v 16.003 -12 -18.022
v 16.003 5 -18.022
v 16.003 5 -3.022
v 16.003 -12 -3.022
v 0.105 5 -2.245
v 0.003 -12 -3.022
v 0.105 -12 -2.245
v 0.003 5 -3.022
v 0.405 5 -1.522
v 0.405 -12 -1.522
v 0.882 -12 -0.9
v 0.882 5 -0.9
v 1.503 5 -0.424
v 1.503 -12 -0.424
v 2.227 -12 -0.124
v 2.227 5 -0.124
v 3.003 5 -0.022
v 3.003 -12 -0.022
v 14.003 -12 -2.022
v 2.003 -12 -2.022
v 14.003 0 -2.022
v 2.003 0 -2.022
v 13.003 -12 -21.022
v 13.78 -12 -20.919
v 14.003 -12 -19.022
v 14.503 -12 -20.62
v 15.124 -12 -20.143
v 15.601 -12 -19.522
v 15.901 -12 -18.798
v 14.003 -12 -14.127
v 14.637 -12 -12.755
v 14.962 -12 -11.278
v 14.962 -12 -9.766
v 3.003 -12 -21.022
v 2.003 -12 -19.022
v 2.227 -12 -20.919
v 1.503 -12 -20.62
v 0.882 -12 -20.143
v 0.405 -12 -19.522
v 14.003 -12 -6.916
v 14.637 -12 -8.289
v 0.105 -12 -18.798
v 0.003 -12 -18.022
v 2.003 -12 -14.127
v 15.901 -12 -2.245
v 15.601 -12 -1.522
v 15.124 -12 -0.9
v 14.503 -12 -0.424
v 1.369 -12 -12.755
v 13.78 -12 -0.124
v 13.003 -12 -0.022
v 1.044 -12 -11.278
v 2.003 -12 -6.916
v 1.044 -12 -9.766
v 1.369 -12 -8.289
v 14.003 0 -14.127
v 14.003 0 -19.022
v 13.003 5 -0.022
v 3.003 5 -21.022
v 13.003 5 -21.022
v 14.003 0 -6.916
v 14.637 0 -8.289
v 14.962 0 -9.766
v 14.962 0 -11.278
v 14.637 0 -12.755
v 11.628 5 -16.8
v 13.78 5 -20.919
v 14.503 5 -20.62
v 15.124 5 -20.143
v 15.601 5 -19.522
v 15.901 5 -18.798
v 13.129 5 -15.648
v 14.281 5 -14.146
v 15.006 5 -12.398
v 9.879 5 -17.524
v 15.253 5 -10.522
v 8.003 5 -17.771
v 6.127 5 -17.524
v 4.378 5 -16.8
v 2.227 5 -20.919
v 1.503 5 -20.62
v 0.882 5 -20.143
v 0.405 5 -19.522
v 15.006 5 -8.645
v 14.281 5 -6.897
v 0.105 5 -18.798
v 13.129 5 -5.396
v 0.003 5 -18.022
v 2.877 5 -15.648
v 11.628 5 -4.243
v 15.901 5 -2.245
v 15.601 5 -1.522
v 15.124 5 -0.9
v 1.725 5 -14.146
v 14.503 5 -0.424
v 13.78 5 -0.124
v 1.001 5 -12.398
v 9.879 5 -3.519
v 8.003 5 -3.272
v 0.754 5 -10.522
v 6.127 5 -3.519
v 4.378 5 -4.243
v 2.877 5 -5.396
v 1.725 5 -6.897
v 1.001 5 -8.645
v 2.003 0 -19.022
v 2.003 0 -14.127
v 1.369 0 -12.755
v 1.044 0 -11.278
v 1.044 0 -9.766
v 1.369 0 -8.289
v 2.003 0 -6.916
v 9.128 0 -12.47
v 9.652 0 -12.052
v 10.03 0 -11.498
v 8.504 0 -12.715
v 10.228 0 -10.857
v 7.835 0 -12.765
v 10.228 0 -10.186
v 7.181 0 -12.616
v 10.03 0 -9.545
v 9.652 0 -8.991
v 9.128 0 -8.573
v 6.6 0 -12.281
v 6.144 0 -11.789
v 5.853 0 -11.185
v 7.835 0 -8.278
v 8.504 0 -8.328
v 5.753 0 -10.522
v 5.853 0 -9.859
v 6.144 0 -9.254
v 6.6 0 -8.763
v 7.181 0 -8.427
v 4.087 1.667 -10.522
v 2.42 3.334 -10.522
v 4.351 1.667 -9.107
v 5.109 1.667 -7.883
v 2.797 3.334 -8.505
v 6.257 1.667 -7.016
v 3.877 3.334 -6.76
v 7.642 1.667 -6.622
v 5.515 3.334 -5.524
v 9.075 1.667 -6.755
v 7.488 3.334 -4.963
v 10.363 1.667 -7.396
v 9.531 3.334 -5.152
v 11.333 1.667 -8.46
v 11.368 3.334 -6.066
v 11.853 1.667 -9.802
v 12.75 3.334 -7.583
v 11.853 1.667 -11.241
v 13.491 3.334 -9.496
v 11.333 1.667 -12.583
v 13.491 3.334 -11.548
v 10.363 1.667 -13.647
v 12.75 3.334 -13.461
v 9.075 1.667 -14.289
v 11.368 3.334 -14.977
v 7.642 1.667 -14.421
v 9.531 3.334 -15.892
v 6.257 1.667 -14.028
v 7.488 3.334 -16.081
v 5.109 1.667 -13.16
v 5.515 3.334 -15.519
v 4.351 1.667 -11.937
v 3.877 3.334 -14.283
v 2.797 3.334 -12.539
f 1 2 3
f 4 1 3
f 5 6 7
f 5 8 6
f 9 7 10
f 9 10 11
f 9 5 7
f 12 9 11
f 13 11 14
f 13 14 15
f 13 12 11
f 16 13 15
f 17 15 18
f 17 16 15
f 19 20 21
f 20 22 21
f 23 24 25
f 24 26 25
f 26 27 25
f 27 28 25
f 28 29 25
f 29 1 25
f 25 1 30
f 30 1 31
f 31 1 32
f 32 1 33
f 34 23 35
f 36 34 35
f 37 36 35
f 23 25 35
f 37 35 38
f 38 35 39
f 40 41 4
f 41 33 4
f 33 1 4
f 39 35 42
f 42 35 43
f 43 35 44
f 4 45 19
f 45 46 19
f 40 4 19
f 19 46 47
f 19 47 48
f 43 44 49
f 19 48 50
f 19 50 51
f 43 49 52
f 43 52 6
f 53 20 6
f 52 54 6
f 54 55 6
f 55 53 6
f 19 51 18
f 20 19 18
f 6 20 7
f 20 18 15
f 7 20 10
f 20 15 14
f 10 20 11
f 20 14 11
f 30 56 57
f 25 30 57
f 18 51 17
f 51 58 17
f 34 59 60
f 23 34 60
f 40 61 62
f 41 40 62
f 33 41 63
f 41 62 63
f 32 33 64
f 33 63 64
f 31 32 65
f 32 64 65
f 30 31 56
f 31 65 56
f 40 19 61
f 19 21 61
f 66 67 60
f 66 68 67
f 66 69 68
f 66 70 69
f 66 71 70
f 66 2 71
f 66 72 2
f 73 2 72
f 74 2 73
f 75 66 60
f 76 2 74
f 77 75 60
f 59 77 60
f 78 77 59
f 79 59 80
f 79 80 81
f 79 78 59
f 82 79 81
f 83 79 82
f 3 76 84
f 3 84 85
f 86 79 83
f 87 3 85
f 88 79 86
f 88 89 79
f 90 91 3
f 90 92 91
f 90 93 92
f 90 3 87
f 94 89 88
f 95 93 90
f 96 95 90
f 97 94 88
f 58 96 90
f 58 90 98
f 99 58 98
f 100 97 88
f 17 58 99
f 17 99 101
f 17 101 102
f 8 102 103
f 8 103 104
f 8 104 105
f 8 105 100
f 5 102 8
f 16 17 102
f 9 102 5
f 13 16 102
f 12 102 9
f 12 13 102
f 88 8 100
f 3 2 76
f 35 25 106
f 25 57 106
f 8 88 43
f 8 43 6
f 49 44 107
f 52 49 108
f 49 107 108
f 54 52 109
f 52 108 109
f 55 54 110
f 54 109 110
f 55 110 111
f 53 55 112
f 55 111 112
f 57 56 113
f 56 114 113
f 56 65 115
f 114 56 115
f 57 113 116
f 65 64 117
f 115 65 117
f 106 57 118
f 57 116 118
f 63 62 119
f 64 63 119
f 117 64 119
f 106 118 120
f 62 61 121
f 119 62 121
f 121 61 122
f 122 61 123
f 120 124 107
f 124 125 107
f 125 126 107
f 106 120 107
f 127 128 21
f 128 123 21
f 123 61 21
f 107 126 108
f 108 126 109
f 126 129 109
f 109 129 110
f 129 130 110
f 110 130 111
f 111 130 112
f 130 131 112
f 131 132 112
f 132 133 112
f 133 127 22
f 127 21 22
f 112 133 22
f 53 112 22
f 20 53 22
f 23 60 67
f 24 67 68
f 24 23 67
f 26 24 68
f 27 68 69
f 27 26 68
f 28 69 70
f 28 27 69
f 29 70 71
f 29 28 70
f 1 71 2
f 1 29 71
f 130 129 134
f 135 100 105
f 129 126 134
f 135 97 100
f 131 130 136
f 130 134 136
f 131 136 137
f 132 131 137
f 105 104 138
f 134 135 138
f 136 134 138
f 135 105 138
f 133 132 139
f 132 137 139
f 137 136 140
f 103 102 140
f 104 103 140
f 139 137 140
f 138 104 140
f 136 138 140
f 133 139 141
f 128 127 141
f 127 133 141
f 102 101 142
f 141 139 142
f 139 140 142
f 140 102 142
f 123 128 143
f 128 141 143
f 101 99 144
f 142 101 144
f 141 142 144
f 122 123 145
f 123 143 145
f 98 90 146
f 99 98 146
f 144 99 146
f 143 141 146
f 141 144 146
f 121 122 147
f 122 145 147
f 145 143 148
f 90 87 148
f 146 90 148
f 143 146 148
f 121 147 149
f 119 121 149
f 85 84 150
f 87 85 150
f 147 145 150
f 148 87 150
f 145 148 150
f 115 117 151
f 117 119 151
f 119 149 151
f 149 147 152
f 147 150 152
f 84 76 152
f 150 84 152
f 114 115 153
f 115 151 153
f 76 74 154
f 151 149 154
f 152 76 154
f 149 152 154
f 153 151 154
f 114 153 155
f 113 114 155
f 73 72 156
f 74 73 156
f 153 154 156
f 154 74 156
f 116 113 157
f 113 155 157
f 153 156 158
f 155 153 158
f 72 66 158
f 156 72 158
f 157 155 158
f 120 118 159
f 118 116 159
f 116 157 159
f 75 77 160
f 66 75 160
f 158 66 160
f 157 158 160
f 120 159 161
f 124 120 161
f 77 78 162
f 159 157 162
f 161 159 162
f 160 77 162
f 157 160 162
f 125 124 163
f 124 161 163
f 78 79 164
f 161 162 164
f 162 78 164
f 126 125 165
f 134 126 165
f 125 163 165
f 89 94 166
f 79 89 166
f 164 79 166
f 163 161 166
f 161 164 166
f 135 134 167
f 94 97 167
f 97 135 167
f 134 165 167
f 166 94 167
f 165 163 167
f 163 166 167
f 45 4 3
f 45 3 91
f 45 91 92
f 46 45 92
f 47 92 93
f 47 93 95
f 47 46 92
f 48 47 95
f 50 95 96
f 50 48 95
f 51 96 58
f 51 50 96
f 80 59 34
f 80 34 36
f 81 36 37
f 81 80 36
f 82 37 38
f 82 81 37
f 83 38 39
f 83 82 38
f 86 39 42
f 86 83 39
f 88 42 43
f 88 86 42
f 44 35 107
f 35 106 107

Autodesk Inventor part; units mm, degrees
ref_plane "YZ Plane" through (0, 0, 0) normal (1, 0, 0) x (0, 1, 0)
ref_plane "XZ Plane" through (0, 0, 0) normal (0, 1, 0) x (-1, 0, 0)
ref_plane "XY Plane" through (0, 0, 0) normal (0, 0, 1) x (1, 0, 0)
sketch "스케치1" plane through (0, 0, 0) normal (0, 1, 0) x (-1, 0, 0)
  line L0 (-3.5031, -21.0217) -> (-3.5031, -19.0217)
  line L1 (-2.5031, -19.0217) -> (-2.5031, -16.0217)
  line L2 (-2.0031, -16.5217) -> (-0.0031, -16.5217)
  line L3 (-12.5031, -19.0217) -> (-12.5031, -21.0217)
  line L4 (-13.5031, -16.0217) -> (-13.5031, -19.0217)
  line L5 (-13.5031, -19.0217) -> (-2.5031, -19.0217)
  line L6 (-2.5031, -16.0217) -> (-13.5031, -16.0217)
  line L7 (-14.0031, -19.0217) -> (-2.0031, -19.0217)
  line L8 (-16.0031, -16.5217) -> (-14.0031, -16.5217)
  line L9 (-0.0031, -21.0217) -> (-16.0031, -21.0217)
  circle A0 centre (-8.0031, -10.5217) radius 5
  line L10 (-0.0031, -21.0217) -> (-0.0031, -0.0217)
  line L11 (-16.0031, -21.0217) -> (-16.0031, -0.0217)
  circle A1 centre (-8.0031, -10.5217) radius 7
  line L12 (-14.0031, -2.0217) -> (-14.0031, -19.0217)
  line L13 (-2.0031, -19.0217) -> (-2.0031, -2.0217)
  line L14 (-2.0031, -4.5217) -> (-0.0031, -4.5217)
  line L15 (-3.5031, -2.0217) -> (-3.5031, -0.0217)
  line L16 (-12.5031, -2.0217) -> (-12.5031, -0.0217)
  line L17 (-14.0031, -4.5217) -> (-16.0031, -4.5217)
  line L18 (-2.0031, -2.0217) -> (-14.0031, -2.0217)
  line L19 (-16.0031, -0.0217) -> (-0.0031, -0.0217)
  circle A2 centre (-8.0031, -10.5217) radius 2.25
  point P0 (0, 0)
  point P1 (-2.0031, -6.9161)
  point P2 (-2.0031, -14.1272)
  point P3 (-14.0031, -14.1272)
  point P4 (-14.0031, -6.9161)
  dimension "d0" = 21
  dimension "d1" = 4.5
  dimension "d19" = 17
  dimension "d20" = 12
  dimension "d21" = 10
extrude "돌출2" add sketch "스케치1" against normal blind 12 contours L9 L3 L5 L0 | L0 L5 L7 L13 L2 L10 L9 | L9 L11 L8 L12 L7 L5 L3 | L2 L13 A1 L14 L10 | L14 L13 L18 L15 L19 L10 | L11 L17 L12 A1 L8 | L11 L19 L16 L18 L12 L17 | L15 L18 L16 L19
extrude "돌출3" add sketch "스케치1" along normal blind 5 contours L9 L3 L5 L0 | L0 L5 L7 L13 L2 L10 L9 | L5 L4 L6 A1 L1 | L9 L11 L8 L12 L7 L5 L3 | L1 L6 A1 L13 L7 | L2 L13 A1 L14 L10 | L7 L12 A1 L6 L4 | L14 L13 L18 L15 L19 L10 | L11 L17 L12 A1 L8 | A1 L6 | L6 A1 L12 L13 | L13 A1 | L13 A1 L12 L18 | L11 L19 L16 L18 L12 L17 | L15 L18 L16 L19 | A1 L12 | A0 | A2
extrude "돌출4" cut sketch "스케치1" along normal blind 13 contours A2
sketch "스케치2" plane through (0, 5, 0) normal (0, 1, 0) x (1, 0, 0)
  point P0 (0, 0)
  point P1 (8.0031, 10.5217)
sketch "스케치3" plane through (0, 5, 0) normal (0, 1, 0) x (1, 0, 0)
  circle A0 centre (8.0031, 10.5217) radius 2.25 projected
  circle A1 centre (8.0031, 10.5217) radius 5
  point P0 (0, 0)
  dimension "d10" = 10
fillet "모깎기1" radius 3 4 edges at (16.0031, -3.5, -21.0217) (0.0031, -3.5, -21.0217) (16.0031, -3.5, -0.0217) (0.0031, -3.5, -0.0217)
chamfer "모따기1" distance 5 angle 45 1 edges at (10.2531, 5, -10.5217) measured on face at (1.9198, 5, -10.5217)
properties part number "센서부 90"
